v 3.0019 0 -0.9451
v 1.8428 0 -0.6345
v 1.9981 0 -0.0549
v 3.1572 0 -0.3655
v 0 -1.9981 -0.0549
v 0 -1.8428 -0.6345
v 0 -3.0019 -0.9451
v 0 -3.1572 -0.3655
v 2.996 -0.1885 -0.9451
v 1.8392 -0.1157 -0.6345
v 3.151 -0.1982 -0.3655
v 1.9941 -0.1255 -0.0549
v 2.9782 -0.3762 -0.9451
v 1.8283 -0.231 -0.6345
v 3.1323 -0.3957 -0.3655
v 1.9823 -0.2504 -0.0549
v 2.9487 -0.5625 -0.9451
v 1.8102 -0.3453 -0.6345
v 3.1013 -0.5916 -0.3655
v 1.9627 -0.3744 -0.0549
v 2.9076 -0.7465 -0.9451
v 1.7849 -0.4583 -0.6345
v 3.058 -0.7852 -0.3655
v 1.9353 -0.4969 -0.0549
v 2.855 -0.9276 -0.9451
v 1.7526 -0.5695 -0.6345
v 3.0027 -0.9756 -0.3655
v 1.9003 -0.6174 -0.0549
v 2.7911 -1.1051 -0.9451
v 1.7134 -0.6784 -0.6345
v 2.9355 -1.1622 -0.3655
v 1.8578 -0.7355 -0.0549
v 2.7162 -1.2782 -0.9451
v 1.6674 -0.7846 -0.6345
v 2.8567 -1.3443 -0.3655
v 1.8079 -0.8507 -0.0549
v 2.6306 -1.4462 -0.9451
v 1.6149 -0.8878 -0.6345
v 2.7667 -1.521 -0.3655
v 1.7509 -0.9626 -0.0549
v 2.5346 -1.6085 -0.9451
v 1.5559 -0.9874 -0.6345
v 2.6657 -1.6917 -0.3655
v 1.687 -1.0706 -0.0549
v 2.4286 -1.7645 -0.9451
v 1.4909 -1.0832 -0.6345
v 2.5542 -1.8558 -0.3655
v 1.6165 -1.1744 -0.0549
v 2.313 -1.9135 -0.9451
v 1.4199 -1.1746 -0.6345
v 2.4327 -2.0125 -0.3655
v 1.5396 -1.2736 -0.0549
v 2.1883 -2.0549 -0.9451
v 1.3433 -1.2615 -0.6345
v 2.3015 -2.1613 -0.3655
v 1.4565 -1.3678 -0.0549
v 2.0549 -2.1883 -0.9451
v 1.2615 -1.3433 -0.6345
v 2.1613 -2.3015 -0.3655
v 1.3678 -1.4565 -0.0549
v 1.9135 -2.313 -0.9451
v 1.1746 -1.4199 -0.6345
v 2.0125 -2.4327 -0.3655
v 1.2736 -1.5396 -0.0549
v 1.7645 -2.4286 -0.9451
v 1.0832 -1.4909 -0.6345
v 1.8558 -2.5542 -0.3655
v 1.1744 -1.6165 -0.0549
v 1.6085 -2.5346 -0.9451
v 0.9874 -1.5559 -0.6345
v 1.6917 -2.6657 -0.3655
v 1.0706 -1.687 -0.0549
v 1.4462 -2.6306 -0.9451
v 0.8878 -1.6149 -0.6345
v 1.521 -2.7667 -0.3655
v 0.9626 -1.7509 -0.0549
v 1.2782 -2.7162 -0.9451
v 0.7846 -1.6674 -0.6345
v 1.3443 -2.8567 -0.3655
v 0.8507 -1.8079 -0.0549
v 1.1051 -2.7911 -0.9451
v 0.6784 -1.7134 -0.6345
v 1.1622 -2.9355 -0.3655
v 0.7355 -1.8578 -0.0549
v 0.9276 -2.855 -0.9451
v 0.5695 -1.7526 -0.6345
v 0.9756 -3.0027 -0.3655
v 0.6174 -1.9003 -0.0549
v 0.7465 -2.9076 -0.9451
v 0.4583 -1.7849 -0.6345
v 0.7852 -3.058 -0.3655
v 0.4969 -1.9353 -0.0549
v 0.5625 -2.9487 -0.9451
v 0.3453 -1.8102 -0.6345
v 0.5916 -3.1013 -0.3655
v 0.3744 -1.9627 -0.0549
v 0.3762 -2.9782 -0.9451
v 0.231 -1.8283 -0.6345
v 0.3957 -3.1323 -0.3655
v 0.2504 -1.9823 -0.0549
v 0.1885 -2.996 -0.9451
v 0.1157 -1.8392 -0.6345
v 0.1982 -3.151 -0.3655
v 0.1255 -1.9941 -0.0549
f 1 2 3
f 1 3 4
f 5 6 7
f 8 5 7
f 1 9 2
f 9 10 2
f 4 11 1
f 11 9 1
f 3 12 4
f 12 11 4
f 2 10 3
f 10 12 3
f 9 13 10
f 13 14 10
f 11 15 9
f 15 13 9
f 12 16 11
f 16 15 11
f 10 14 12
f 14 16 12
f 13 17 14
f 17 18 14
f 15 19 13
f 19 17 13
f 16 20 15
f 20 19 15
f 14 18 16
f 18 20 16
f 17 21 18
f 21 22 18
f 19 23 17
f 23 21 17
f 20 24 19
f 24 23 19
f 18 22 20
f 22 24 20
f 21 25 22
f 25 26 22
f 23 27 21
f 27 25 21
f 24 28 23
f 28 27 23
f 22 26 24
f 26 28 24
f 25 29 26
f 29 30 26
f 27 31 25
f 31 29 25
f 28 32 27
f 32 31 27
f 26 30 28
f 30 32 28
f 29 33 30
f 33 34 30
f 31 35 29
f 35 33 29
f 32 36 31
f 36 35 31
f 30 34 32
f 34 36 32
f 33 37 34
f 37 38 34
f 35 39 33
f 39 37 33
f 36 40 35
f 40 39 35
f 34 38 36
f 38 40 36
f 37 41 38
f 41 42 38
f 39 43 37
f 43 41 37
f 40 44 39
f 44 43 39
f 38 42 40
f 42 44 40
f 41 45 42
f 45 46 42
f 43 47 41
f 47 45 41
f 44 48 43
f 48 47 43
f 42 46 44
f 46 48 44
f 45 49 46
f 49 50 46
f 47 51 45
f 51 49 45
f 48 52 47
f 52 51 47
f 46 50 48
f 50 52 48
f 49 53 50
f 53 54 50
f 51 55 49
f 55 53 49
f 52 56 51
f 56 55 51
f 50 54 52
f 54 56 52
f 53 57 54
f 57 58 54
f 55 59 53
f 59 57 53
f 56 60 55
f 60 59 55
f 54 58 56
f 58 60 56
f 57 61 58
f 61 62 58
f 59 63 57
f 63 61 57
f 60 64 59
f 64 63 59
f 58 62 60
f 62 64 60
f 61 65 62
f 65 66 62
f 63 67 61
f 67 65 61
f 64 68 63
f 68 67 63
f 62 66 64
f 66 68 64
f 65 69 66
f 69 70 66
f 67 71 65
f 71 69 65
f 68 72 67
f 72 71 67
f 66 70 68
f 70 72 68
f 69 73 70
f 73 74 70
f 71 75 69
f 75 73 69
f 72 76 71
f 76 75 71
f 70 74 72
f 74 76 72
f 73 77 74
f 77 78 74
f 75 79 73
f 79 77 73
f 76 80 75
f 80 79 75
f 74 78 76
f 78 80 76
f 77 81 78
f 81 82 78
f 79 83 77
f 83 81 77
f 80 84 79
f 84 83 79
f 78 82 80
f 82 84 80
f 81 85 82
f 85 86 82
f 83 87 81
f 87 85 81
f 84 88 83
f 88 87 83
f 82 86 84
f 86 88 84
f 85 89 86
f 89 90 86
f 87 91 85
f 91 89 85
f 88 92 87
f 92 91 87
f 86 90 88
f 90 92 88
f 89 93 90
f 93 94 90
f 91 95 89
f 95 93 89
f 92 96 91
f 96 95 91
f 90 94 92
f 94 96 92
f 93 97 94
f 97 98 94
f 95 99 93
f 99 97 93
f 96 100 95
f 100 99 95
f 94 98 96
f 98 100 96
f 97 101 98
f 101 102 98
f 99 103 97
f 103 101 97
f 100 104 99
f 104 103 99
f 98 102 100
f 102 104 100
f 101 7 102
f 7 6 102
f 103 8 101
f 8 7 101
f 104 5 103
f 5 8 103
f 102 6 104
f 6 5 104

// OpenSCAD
$fn=100;
rotate_extrude(angle=-90)
translate([2.5, -0.5, 0])
rotate([0, 0, -15])
square(size=[1.2, 0.6], center=true);
